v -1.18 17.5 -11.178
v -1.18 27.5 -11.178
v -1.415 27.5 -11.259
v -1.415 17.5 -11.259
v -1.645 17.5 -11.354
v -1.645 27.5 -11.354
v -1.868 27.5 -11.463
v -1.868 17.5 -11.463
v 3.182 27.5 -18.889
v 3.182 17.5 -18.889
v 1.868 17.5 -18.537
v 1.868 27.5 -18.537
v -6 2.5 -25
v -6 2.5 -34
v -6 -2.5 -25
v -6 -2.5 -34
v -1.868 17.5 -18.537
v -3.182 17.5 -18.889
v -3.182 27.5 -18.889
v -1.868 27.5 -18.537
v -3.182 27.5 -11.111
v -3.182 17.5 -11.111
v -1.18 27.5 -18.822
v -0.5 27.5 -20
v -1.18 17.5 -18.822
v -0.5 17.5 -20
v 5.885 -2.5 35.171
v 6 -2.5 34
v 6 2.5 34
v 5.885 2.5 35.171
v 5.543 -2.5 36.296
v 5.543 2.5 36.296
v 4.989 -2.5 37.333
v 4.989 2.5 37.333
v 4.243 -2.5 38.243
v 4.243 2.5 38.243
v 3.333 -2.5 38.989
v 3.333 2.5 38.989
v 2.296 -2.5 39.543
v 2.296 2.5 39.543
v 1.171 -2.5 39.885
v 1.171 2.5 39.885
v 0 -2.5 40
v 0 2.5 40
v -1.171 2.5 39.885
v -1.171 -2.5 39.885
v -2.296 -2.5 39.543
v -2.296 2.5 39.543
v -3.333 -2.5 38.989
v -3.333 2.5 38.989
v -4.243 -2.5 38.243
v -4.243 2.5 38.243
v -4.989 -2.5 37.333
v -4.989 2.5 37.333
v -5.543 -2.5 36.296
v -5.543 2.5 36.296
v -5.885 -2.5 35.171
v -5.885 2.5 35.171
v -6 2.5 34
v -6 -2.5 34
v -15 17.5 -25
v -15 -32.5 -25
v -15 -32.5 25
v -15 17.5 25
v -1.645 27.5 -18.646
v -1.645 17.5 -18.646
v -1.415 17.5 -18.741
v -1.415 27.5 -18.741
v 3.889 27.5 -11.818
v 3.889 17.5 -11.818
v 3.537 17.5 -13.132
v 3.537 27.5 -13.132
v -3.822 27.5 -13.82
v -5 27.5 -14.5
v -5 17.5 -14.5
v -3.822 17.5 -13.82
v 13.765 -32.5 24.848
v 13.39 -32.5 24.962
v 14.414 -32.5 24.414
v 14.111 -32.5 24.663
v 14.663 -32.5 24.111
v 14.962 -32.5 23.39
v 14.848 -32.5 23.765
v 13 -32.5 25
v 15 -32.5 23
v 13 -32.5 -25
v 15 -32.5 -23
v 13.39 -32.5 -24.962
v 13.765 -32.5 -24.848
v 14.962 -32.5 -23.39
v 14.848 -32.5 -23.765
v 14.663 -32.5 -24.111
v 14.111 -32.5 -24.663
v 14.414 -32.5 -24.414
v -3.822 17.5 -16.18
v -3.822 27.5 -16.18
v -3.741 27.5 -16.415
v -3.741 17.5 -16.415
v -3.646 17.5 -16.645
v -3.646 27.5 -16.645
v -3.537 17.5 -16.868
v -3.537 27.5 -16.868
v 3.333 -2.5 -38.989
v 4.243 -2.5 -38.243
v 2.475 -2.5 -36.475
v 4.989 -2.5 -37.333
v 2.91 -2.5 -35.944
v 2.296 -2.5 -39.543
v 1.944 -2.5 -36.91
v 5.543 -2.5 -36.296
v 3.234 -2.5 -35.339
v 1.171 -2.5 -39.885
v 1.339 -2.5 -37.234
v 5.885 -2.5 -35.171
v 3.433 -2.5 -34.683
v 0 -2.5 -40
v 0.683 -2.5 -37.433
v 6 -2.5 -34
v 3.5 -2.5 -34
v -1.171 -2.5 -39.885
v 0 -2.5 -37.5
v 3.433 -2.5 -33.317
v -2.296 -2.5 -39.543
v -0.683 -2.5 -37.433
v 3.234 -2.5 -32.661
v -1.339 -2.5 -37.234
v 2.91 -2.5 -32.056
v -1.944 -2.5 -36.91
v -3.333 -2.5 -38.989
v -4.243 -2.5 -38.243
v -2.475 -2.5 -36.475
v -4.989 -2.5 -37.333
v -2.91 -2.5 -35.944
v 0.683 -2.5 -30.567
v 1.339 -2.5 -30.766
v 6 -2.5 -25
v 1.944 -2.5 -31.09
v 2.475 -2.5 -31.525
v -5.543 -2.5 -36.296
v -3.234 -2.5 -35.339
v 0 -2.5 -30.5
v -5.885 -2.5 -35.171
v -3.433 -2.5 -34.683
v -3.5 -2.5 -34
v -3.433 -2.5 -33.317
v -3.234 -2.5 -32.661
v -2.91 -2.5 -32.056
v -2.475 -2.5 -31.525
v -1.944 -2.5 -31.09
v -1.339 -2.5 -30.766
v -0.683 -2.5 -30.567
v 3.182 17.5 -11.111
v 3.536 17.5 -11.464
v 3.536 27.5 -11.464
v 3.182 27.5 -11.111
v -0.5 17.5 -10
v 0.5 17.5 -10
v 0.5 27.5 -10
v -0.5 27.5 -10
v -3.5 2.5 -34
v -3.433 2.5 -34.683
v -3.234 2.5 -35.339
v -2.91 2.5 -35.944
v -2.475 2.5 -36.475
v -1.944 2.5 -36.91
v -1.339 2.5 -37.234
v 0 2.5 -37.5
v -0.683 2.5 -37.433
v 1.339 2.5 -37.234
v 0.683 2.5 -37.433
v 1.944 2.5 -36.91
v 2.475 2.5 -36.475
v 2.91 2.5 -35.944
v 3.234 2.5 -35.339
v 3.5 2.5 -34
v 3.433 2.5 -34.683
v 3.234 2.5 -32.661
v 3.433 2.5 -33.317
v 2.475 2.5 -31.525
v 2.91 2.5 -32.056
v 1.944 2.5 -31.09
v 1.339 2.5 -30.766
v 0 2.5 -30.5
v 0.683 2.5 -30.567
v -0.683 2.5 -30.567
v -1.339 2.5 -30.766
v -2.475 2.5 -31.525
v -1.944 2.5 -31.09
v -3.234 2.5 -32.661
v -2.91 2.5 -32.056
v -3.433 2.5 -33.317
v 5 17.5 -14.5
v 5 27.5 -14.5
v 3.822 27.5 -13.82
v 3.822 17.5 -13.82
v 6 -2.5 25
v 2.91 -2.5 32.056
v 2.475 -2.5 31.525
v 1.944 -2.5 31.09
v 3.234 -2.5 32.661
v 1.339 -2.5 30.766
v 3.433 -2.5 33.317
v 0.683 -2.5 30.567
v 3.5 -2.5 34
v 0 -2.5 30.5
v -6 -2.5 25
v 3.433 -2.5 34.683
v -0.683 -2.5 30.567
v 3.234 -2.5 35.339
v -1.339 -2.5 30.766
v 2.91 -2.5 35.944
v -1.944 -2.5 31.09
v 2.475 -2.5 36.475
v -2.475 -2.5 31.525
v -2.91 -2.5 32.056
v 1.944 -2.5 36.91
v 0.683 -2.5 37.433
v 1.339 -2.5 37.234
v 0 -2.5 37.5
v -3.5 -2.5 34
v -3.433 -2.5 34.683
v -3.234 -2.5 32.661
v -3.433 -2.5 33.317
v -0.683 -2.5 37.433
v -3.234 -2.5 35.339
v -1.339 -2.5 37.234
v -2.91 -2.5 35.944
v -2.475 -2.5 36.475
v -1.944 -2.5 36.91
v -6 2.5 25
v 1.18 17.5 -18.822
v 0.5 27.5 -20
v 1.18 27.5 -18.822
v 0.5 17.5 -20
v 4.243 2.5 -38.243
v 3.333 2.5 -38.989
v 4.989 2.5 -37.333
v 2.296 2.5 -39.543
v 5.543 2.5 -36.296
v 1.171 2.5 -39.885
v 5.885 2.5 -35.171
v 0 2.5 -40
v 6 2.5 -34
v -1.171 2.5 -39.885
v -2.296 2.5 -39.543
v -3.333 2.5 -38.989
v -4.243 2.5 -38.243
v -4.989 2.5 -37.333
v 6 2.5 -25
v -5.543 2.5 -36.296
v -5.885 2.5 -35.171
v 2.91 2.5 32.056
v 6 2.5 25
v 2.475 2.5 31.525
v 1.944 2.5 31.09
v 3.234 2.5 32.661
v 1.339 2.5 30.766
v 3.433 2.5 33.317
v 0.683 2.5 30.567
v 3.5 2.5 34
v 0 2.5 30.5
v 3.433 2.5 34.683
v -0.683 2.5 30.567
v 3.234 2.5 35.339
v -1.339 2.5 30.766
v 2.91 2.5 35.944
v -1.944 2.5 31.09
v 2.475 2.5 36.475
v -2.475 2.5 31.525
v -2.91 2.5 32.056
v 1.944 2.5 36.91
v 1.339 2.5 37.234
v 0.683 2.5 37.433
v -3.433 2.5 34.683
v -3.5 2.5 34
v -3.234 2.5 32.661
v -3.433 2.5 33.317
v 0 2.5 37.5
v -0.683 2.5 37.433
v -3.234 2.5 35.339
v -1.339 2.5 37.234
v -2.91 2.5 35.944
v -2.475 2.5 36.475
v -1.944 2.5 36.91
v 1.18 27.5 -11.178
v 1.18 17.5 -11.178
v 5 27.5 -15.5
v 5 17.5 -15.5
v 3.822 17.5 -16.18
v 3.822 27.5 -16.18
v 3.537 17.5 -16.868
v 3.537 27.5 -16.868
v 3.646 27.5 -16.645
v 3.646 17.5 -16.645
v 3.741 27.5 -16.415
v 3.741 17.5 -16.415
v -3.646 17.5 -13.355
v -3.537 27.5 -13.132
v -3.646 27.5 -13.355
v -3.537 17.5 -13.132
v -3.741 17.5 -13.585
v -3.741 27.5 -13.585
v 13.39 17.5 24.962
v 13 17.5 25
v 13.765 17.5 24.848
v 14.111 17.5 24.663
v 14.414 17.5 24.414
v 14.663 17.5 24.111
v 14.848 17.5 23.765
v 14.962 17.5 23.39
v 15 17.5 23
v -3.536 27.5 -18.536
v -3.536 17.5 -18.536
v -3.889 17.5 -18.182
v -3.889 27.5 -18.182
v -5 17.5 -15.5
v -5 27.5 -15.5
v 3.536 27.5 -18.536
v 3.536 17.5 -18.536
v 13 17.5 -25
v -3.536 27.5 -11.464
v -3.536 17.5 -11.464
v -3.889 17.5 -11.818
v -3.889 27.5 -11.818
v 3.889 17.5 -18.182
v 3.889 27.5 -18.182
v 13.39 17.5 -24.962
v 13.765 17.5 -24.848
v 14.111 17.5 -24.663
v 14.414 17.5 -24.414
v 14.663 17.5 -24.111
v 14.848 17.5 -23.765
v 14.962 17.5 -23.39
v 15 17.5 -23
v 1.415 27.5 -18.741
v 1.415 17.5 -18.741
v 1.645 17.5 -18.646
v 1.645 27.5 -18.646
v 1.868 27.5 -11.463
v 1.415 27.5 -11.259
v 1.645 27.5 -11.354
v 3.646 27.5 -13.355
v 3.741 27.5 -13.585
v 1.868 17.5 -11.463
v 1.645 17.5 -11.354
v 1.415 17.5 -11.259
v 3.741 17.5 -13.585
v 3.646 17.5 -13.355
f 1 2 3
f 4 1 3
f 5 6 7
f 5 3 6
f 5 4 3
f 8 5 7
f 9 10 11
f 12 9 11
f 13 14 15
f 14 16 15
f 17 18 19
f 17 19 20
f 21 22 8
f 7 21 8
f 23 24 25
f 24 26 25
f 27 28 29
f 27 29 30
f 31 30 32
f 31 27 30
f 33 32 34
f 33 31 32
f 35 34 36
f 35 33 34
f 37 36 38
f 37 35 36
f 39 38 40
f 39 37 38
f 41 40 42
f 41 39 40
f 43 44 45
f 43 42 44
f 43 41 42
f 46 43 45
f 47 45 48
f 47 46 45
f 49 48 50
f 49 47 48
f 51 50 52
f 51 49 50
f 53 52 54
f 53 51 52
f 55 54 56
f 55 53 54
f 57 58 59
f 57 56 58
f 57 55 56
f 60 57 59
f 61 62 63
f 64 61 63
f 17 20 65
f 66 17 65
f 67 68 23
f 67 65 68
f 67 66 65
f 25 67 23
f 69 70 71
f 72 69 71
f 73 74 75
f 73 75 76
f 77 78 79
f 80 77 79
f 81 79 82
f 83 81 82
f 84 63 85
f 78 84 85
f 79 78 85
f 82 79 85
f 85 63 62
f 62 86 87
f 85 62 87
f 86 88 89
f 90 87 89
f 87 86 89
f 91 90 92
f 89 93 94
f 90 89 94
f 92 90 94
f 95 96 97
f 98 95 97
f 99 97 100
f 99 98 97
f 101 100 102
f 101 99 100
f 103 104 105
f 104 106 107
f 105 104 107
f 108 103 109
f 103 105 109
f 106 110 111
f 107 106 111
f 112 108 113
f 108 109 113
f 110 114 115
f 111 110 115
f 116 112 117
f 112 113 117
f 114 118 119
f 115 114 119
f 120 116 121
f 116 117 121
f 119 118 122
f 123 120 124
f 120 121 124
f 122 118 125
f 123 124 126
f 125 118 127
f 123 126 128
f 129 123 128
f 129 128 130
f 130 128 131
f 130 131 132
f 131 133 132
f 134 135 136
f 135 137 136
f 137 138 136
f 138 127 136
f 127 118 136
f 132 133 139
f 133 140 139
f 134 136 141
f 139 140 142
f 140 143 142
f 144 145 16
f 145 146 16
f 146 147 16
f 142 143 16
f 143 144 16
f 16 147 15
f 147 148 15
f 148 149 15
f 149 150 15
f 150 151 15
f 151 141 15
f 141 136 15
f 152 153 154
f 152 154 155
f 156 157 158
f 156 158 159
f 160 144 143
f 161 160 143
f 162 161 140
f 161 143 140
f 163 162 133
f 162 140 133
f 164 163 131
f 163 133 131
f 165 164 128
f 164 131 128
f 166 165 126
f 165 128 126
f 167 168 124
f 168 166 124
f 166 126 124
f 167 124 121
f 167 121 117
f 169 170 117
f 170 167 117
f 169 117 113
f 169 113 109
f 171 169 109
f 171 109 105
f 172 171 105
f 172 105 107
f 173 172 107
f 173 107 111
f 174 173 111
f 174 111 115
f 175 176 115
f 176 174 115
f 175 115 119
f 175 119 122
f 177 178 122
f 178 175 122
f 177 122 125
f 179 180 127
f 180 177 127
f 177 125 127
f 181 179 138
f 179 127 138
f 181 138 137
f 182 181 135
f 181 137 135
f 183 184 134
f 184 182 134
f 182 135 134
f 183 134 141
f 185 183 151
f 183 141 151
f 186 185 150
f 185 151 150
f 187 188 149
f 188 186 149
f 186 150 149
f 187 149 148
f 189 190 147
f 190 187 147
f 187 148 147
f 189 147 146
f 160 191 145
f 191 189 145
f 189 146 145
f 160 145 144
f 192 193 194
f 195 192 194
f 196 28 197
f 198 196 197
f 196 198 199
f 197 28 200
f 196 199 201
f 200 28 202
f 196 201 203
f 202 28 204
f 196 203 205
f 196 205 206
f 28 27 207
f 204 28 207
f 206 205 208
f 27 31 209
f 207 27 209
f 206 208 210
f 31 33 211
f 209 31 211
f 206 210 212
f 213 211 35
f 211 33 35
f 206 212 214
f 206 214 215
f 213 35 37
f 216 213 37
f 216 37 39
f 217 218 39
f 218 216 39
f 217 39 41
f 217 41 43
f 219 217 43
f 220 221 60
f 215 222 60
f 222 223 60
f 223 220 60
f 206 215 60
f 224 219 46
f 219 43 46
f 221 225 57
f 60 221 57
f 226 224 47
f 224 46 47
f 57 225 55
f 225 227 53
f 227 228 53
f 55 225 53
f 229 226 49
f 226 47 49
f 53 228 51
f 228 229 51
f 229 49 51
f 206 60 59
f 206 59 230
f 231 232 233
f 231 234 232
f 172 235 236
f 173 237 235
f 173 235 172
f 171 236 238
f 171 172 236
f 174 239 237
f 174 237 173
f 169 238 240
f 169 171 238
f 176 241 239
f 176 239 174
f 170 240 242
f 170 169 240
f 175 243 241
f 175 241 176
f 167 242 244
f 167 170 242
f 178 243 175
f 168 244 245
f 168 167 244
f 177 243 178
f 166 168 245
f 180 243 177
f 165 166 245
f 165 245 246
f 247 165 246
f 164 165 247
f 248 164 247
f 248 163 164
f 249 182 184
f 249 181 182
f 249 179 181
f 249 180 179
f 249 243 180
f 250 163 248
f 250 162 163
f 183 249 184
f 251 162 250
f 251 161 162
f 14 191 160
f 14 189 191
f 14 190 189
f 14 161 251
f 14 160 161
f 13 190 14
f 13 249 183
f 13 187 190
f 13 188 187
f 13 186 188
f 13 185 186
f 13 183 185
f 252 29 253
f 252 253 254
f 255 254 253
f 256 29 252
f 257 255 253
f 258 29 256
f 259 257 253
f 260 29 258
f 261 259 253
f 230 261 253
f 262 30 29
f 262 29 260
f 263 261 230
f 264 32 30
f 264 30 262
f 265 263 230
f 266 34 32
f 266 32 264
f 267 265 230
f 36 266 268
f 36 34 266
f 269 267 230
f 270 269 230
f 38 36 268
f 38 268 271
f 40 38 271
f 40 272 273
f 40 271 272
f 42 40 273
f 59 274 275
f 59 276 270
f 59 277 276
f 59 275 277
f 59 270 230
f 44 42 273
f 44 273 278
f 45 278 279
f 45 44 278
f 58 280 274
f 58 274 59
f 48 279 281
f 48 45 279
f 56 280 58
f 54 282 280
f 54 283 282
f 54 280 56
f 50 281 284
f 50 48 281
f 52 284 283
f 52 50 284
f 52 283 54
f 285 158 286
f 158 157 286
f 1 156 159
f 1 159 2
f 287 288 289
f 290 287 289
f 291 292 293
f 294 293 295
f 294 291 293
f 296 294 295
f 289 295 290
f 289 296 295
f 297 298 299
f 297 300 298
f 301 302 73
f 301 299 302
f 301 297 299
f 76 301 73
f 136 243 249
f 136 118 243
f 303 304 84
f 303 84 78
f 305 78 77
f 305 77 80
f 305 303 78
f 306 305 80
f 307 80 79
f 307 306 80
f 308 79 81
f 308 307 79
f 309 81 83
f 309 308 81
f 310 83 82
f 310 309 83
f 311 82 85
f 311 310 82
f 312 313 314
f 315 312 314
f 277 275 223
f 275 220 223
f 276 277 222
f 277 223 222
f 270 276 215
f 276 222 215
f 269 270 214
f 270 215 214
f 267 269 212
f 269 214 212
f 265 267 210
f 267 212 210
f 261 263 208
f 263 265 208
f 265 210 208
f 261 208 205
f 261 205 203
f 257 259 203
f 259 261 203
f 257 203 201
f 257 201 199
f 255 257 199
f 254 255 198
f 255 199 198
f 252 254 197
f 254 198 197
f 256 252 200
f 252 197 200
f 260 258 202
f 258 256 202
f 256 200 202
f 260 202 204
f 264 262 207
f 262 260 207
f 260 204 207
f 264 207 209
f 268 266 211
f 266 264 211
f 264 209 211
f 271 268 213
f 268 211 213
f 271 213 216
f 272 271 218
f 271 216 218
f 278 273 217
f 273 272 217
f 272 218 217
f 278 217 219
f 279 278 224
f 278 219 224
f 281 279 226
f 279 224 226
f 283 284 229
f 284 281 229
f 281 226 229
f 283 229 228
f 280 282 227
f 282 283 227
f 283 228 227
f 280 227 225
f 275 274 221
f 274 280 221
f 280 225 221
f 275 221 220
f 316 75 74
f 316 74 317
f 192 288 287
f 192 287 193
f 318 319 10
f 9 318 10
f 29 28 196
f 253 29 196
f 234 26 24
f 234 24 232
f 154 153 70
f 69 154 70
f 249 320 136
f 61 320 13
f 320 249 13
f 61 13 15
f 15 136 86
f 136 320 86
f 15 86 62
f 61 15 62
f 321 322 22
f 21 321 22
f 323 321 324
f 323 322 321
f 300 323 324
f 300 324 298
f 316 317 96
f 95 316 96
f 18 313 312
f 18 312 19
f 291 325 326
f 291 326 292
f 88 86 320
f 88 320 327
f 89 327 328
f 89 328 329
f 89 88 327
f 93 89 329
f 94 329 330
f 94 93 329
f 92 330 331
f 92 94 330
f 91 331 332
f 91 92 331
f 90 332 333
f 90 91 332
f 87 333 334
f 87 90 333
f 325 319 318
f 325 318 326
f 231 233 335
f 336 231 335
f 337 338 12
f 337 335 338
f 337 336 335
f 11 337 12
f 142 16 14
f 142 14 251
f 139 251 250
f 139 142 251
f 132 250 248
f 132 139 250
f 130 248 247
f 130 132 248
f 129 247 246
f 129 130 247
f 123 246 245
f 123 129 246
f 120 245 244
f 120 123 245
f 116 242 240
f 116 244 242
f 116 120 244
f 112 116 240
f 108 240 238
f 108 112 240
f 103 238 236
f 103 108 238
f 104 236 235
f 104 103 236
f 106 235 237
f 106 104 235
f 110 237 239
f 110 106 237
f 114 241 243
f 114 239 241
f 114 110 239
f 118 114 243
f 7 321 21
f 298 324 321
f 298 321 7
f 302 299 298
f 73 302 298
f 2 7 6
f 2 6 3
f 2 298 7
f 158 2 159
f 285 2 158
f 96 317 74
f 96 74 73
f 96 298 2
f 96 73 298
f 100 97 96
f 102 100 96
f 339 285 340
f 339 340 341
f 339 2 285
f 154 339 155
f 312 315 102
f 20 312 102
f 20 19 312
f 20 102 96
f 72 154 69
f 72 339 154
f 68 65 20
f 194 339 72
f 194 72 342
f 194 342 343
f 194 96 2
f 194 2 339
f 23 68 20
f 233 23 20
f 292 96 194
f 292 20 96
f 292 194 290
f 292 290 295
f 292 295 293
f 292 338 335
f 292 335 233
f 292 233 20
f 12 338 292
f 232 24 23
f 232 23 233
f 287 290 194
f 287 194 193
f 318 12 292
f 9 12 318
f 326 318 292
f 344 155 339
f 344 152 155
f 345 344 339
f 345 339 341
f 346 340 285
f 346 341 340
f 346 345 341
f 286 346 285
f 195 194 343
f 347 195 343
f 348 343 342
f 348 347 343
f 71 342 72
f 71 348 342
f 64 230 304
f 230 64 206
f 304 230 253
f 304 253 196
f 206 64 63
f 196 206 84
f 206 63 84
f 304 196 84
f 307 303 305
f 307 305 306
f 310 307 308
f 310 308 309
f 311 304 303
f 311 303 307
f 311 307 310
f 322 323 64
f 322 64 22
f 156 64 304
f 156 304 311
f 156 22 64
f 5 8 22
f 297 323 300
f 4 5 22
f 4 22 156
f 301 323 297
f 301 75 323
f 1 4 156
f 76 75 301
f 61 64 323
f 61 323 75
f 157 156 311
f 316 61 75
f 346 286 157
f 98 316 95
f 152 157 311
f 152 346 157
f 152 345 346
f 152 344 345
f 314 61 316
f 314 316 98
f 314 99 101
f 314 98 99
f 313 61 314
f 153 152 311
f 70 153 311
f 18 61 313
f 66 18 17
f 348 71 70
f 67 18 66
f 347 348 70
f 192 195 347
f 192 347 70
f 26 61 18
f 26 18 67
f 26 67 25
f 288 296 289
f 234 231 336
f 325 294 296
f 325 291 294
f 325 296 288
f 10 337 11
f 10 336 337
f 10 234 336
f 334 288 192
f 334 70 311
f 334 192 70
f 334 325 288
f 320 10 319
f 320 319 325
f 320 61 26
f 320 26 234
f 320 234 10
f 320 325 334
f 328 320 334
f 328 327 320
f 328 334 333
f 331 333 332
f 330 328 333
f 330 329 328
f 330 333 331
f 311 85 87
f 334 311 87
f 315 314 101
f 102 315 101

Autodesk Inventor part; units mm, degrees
ref_plane "YZ Plane" through (0, 0, 0) normal (1, 0, 0) x (0, 1, 0)
ref_plane "XZ Plane" through (0, 0, 0) normal (0, 1, 0) x (-1, 0, 0)
ref_plane "XY Plane" through (0, 0, 0) normal (0, 0, 1) x (1, 0, 0)
sketch "Sketch1" plane through (0, 0, 0) normal (0, 1, 0) x (-1, 0, 0)
  line L0 (15, 25) -> (-15, 25)
  line L1 (-15, 25) -> (-15, -25)
  line L2 (-15, -25) -> (15, -25)
  line L3 (15, -25) -> (15, 25)
  circle A0 centre (0, -34) radius 3.5
  arc A1 (-6, -34) -> (6, -34) centre (0, -34) ccw
  line L4 (6, -34) -> (6, -25)
  line L5 (-6, -34) -> (-6, -25)
  line L6 (21.3749, 0) -> (-33.1106, 0) construction
  circle A2 centre (0, 34) radius 3.5
  arc A3 (6, 34) -> (-6, 34) centre (0, 34) ccw
  line L7 (6, 34) -> (6, 25)
  line L8 (-6, 34) -> (-6, 25)
  point P0 (0, 0)
  dimension "d0" = 25
  dimension "d1" = 25
  dimension "d2" = 15
  dimension "d3" = 15
  dimension "d4" = 7
  dimension "d5" = 12
  dimension "d6" = 9
  dimension "d7" = 34
  dimension "d8" = 12
  dimension "d9" = 34
extrude "Extrusion1" add sketch "Sketch1" along normal mid plane 5
sketch "Sketch2" plane through (0, 2.5, 0) normal (0, 1, 0) x (1, 0, 0)
  line L0 (-15, -25) -> (-15, 25) projected
  line L1 (6, 25) -> (15, 25) projected
  line L2 (-15, -25) -> (15, -25)
  line L3 (15, -25) -> (15, 25)
  line L4 (15, 25) -> (-15, 25)
  line L5 (-15, 25) -> (-15, -25)
  point P0 (0, 0)
extrude "Extrusion2" add sketch "Sketch2" along normal blind 15 and the other way blind 35
sketch "Sketch3" plane through (0, 17.5, 0) normal (0, 1, 0) x (1, 0, 0)
  circle A0 centre (0, 15) radius 4
  line L0 (15, 25) -> (-15, 25) projected
  line L1 (-4, 15) -> (-5, 15) construction
  line L2 (-5, 15) -> (-5, 15.5)
  line L3 (-5, 15.5) -> (-3.8219, 16.1802)
  line L4 (-5, 15) -> (-5, 14.5)
  line L5 (-5, 14.5) -> (-3.8219, 13.8198)
  line L6 (-3.8891, 11.818) -> (-3.537, 13.132)
  line L7 (-3.5355, 11.4645) -> (-3.8891, 11.818)
  line L8 (-3.5355, 11.4645) -> (-3.182, 11.1109)
  line L9 (-3.182, 11.1109) -> (-1.868, 11.463)
  line L10 (-0.5, 10) -> (-1.1802, 11.1781)
  line L11 (0, 10) -> (-0.5, 10)
  line L12 (0, 10) -> (0.5, 10)
  line L13 (0.5, 10) -> (1.1802, 11.1781)
  line L14 (3.182, 11.1109) -> (1.868, 11.463)
  line L15 (3.5355, 11.4645) -> (3.182, 11.1109)
  line L16 (3.5355, 11.4645) -> (3.8891, 11.818)
  line L17 (3.8891, 11.818) -> (3.537, 13.132)
  line L18 (5, 14.5) -> (3.8219, 13.8198)
  line L19 (5, 15) -> (5, 14.5)
  line L20 (5, 15) -> (5, 15.5)
  line L21 (5, 15.5) -> (3.8219, 16.1802)
  line L22 (3.8891, 18.182) -> (3.537, 16.868)
  line L23 (3.5355, 18.5355) -> (3.8891, 18.182)
  line L24 (3.5355, 18.5355) -> (3.182, 18.8891)
  line L25 (3.182, 18.8891) -> (1.868, 18.537)
  line L26 (0.5, 20) -> (1.1802, 18.8219)
  line L27 (0, 20) -> (0.5, 20)
  line L28 (0, 20) -> (-0.5, 20)
  line L29 (-0.5, 20) -> (-1.1802, 18.8219)
  line L30 (-3.182, 18.8891) -> (-1.868, 18.537)
  line L31 (-3.5355, 18.5355) -> (-3.182, 18.8891)
  line L32 (-3.5355, 18.5355) -> (-3.8891, 18.182)
  line L33 (-3.8891, 18.182) -> (-3.537, 16.868)
  point P0 (0, 0)
  dimension "d16" = 8
  dimension "d17" = 10
  dimension "d18" = 15
  dimension "d19" = 120
  dimension "d20" = 0
  dimension "d21" = 1
  dimension "d22" = 0.5
  dimension "d25" = 360
extrude "Extrusion3" add sketch "Sketch3" along normal blind 10
fillet "Fillet1" radius 2 2 edges at (15, -7.5, 25) (15, -7.5, -25)
thread "Thread1" size "M7x1" class "6H" standard "ANSI Metric M Profile" full length
thread "Thread2" size "M7x1" class "6H" standard "ANSI Metric M Profile" full length
properties part number "servo" material "Rubber"
